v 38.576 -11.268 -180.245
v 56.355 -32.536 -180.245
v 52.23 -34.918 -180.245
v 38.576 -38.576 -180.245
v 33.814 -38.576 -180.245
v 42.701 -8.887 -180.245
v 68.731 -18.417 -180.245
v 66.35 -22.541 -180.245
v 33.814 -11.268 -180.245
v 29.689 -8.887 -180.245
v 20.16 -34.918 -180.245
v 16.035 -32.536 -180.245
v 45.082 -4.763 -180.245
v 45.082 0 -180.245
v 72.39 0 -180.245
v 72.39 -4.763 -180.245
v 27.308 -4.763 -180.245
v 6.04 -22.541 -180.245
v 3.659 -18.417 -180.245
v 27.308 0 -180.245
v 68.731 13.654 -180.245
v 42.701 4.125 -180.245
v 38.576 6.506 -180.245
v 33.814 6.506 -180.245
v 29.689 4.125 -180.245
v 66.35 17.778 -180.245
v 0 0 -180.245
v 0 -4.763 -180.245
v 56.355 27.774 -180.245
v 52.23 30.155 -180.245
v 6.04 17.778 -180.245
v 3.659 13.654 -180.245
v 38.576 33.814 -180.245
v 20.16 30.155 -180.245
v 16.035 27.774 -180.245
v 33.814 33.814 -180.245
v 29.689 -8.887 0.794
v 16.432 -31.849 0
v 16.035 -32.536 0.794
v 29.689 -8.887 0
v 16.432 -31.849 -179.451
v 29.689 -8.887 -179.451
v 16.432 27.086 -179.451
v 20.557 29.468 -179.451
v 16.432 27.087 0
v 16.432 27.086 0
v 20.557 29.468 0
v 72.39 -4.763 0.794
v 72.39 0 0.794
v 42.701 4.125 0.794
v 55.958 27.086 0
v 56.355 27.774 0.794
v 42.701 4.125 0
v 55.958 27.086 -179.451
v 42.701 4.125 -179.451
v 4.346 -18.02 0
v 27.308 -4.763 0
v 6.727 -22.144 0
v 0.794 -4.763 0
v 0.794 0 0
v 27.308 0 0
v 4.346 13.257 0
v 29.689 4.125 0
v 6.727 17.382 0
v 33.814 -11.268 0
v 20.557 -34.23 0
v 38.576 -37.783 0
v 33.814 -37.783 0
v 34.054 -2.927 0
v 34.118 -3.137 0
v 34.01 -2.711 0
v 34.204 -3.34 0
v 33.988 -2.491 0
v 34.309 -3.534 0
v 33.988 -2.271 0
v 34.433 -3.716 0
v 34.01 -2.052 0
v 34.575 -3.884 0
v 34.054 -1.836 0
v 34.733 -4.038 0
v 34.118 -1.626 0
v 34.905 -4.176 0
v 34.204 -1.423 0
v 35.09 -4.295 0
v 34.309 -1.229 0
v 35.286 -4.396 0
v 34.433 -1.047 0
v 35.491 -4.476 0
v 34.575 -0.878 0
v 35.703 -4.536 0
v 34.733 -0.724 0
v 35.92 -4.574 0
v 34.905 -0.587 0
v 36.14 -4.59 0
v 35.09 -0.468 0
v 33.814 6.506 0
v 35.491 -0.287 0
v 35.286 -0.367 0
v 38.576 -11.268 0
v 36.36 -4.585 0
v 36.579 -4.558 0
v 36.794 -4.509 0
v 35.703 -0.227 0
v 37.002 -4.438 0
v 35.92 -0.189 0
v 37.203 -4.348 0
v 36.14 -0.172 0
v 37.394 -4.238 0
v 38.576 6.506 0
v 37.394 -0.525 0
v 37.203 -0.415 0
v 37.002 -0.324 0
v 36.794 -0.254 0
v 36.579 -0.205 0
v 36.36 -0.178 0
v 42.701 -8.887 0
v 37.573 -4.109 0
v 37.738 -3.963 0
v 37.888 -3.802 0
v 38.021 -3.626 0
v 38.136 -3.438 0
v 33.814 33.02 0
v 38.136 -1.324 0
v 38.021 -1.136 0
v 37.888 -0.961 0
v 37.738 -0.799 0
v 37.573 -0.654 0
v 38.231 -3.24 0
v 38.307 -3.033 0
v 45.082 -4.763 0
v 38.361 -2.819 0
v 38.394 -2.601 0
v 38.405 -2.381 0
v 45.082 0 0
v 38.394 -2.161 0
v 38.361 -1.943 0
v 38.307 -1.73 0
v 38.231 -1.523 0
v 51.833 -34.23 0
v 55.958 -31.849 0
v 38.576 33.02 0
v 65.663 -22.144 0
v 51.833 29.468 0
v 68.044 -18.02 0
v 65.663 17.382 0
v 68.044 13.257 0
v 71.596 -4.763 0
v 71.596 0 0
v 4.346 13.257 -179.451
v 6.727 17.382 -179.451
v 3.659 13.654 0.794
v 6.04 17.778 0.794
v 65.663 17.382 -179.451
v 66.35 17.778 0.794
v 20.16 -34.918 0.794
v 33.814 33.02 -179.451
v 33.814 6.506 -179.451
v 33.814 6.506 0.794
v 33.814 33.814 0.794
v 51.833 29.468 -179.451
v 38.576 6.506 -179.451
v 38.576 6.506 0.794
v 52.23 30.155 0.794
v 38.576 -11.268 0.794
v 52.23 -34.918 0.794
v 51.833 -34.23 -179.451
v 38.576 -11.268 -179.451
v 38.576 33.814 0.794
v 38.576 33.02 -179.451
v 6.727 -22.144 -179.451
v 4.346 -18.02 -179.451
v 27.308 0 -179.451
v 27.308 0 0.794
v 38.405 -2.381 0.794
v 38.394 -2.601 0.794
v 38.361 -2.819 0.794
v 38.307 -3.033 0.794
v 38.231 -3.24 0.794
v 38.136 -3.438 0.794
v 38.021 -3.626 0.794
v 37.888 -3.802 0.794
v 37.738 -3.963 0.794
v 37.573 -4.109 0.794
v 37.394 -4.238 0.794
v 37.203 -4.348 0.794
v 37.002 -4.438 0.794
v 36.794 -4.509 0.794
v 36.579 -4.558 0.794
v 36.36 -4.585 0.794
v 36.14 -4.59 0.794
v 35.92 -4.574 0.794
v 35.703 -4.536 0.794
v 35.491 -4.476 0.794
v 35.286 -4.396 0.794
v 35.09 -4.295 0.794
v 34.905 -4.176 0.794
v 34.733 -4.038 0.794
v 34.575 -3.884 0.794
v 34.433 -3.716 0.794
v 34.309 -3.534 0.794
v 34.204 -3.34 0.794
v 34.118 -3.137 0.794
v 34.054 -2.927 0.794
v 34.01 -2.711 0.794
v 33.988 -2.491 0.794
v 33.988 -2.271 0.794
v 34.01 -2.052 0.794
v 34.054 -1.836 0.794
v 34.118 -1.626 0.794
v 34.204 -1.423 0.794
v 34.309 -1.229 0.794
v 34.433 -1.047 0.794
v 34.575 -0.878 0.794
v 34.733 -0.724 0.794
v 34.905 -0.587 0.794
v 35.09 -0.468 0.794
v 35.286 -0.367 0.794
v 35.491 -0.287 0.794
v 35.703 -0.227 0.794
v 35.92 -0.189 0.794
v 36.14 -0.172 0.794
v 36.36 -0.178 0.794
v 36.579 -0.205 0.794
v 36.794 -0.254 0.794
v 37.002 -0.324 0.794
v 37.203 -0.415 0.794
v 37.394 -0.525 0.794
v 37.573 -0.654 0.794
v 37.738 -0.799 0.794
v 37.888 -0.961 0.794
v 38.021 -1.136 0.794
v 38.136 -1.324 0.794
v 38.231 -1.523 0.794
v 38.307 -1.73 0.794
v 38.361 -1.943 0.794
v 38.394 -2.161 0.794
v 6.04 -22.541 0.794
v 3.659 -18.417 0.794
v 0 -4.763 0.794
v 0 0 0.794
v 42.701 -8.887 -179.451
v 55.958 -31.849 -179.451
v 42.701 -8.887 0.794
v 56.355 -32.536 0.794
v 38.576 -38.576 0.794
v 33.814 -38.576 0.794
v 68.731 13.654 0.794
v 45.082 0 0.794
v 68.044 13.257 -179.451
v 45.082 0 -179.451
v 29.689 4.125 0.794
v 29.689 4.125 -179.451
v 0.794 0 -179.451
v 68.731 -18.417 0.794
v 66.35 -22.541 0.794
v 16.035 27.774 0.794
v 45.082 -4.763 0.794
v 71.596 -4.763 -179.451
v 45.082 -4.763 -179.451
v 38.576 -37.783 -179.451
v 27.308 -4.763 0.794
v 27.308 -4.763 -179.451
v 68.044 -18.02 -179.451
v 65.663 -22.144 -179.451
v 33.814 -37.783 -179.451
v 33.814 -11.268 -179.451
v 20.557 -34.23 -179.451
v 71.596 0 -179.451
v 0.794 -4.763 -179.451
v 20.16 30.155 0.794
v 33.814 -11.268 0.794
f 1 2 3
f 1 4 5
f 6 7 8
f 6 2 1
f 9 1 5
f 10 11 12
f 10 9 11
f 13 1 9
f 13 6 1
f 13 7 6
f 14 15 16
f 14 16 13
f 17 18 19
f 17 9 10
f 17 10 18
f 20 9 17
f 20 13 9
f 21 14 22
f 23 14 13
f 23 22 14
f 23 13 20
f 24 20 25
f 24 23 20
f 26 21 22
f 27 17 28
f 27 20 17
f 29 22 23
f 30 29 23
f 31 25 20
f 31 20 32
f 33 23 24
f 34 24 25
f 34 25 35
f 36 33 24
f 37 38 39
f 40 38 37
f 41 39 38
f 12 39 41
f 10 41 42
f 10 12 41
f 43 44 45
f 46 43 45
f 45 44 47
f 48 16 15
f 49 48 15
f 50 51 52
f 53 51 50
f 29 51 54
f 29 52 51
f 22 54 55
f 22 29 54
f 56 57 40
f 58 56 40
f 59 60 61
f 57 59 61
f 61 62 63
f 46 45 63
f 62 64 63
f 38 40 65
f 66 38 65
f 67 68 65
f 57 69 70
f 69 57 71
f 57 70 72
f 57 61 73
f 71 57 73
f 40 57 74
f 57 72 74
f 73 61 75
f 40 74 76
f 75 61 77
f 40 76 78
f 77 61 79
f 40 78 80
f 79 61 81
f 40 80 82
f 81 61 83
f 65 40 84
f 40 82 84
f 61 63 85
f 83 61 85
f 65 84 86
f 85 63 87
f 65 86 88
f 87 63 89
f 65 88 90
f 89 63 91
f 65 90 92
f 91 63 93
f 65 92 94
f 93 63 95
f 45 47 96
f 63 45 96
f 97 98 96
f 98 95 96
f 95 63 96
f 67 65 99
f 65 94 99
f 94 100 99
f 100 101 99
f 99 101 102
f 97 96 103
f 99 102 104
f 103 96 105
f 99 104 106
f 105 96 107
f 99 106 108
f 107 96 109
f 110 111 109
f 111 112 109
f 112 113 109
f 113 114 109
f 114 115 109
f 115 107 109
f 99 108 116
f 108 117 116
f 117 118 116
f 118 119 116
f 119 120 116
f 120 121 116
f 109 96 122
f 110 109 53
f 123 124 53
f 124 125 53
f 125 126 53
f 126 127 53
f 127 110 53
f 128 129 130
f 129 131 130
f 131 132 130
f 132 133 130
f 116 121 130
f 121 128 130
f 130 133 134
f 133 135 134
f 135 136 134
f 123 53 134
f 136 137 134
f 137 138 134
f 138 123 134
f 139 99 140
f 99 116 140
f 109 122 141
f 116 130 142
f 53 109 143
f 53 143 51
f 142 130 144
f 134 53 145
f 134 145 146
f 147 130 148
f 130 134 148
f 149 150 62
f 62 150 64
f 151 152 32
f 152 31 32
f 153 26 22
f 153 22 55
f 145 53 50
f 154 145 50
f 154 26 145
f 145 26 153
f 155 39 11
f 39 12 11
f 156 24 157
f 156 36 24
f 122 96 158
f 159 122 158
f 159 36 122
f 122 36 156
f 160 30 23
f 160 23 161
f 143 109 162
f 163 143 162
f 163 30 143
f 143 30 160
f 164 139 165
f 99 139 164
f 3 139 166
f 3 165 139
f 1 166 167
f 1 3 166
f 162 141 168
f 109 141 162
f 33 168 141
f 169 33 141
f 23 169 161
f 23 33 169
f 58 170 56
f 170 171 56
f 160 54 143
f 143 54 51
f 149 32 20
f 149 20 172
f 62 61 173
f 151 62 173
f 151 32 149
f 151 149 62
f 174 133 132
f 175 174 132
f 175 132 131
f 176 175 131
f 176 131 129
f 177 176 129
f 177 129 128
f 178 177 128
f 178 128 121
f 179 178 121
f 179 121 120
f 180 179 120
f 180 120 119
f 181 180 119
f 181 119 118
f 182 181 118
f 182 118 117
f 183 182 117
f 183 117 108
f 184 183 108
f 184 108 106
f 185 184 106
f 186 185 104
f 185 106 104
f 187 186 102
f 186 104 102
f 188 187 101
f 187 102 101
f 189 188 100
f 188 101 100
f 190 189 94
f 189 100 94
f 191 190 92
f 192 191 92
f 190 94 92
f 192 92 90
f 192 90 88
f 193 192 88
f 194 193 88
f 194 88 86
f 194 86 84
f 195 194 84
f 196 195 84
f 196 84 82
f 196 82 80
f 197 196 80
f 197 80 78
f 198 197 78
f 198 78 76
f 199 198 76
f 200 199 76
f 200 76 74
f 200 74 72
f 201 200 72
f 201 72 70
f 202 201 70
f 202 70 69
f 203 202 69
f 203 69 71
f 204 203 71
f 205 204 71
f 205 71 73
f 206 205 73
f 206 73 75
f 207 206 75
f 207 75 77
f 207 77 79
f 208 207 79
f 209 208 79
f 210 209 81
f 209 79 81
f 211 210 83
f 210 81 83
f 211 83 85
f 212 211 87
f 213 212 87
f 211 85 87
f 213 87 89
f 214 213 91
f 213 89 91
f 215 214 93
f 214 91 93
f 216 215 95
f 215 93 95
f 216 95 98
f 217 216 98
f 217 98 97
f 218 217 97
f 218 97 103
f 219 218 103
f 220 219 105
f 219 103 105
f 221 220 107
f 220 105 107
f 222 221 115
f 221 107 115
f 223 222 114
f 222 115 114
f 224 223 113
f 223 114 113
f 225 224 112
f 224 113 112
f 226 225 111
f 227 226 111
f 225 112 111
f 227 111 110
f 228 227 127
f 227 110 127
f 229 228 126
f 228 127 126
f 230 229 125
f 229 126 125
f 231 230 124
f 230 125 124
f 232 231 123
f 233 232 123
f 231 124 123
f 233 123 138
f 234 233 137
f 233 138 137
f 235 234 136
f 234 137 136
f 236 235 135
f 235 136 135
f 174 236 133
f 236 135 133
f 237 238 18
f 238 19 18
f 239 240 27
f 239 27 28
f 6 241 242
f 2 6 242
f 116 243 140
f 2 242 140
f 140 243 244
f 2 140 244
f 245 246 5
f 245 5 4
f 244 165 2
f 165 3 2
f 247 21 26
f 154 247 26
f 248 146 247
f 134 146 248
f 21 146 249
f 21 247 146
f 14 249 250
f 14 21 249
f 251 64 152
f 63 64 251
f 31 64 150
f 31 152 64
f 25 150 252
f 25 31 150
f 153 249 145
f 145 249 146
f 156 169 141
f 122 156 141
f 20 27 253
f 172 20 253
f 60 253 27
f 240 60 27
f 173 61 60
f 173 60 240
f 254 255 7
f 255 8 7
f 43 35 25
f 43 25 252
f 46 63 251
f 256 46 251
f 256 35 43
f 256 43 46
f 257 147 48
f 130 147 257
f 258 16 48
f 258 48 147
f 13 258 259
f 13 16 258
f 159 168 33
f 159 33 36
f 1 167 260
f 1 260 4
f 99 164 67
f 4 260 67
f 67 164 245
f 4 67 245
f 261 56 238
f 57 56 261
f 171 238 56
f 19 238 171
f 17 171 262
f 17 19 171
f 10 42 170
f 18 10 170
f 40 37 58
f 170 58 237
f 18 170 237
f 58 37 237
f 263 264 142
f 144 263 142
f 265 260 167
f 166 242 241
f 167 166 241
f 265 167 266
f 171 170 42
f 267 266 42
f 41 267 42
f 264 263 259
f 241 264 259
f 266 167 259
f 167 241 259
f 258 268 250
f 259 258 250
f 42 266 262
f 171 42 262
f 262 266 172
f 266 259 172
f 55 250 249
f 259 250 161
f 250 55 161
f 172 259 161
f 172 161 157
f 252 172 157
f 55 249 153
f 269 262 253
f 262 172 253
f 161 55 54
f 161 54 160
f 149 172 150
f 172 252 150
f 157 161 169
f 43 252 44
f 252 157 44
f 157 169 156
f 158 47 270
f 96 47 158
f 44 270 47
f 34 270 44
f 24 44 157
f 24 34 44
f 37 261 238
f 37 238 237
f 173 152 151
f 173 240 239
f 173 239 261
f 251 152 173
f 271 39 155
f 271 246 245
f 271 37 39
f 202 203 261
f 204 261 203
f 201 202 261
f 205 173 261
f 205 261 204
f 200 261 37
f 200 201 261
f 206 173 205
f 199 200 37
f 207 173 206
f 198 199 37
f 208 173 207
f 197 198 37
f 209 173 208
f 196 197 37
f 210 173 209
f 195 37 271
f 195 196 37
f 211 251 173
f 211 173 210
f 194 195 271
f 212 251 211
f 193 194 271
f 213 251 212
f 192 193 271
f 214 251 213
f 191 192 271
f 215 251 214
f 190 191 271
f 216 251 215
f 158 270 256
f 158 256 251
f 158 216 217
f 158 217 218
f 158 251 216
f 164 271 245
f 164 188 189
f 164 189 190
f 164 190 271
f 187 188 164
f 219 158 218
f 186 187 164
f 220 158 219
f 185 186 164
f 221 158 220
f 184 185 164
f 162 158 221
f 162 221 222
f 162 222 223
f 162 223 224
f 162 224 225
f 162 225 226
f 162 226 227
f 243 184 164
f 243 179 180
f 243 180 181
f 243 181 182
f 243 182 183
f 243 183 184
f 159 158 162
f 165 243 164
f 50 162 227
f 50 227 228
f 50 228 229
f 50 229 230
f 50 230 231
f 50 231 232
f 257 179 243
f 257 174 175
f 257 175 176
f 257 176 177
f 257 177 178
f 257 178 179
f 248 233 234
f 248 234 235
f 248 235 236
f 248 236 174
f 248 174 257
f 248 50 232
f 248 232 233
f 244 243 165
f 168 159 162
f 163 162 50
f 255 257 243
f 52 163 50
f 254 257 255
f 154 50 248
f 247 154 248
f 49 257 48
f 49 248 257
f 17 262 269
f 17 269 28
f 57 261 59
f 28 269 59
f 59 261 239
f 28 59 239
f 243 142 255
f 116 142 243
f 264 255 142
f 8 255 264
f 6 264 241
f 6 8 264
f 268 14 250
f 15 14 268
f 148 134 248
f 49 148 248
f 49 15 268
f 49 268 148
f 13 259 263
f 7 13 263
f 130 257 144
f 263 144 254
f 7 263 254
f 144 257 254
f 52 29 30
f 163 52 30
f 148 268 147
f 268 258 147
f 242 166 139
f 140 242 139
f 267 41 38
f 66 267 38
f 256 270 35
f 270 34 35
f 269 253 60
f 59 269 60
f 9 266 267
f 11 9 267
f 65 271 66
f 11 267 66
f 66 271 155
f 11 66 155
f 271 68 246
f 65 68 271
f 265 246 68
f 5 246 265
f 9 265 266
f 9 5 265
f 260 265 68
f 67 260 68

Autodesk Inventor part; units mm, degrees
ref_plane "YZ Plane" through (0, 0, 0) normal (1, 0, 0) x (0, 1, 0)
ref_plane "XZ Plane" through (0, 0, 0) normal (0, 1, 0) x (-1, 0, 0)
ref_plane "XY Plane" through (0, 0, 0) normal (0, 0, 1) x (1, 0, 0)
sketch "Sketch1" plane through (0, 0, 0) normal (0, 0, 1) x (1, 0, 0)
  line L0 (0, 0) -> (72.39, 0)
  line L1 (72.39, 0) -> (72.39, -4.7625)
  line L2 (0, 0) -> (0, -4.7625)
  line L3 (0, -4.7625) -> (72.39, -4.7625)
  circle A0 centre (36.195, -2.3813) radius 2.2098
  dimension "d0" = 72.39
  dimension "d1" = 4.7625
  dimension "d2" = 4.7625
  dimension "d3" = 4.4196
extrude "Extrusion1" add sketch "Sketch1" along normal blind 0.7937
sketch "Sketch2" plane through (0, -4.7625, 0) normal (-1, 0, 0) x (0, 0, 1)
  line L0 (0, 0) -> (0, 4.7625) projected
  line L1 (0, 4.7625) -> (-179.451, 4.7625)
  line L2 (-179.451, 4.7625) -> (-179.451, 0)
  line L3 (-179.451, 0) -> (0, 0)
  dimension "d6" = 179.451
extrude "Extrusion2" add sketch "Sketch2" against normal blind 0.7937
sketch "Sketch3" plane through (0, -4.7625, -179.451) normal (0, 0, -1) x (-1, 0, 0)
  line L0 (0, 4.7625) -> (0, 0) projected
  line L1 (-72.39, 0) -> (-72.39, 4.7625) projected
  line L2 (0, 4.7625) -> (-72.39, 4.7625)
  line L3 (-72.39, 4.7625) -> (-72.39, 0)
  line L4 (-72.39, 0) -> (0, 0)
  line L5 (0, 0) -> (0, 4.7625)
extrude "Extrusion3" add sketch "Sketch3" along normal blind 0.7937
sketch "Sketch4" plane through (72.39, -4.7625, 0) normal (1, 0, 0) x (0, 0, -1)
  line L0 (0, 0) -> (0, 4.7625) projected
  line L1 (179.451, 4.7625) -> (0, 4.7625) projected
  line L2 (0, 4.7625) -> (179.451, 4.7625)
  line L3 (0, 0) -> (179.451, 0) projected
  line L4 (179.451, 4.7625) -> (179.451, 0)
  line L5 (179.451, 0) -> (0, 0)
  line L6 (0, 0) -> (0, 4.7625)
extrude "Extrusion4" add sketch "Sketch4" against normal blind 0.7937
pattern_circular "Circular Pattern1" count 12 over 360 about axis through (36.195, -2.3813, 0) along (0, 0, 1) of "Extrusion3", "Extrusion2", "Extrusion1", "Extrusion4"
properties part number "Rubber Band"
